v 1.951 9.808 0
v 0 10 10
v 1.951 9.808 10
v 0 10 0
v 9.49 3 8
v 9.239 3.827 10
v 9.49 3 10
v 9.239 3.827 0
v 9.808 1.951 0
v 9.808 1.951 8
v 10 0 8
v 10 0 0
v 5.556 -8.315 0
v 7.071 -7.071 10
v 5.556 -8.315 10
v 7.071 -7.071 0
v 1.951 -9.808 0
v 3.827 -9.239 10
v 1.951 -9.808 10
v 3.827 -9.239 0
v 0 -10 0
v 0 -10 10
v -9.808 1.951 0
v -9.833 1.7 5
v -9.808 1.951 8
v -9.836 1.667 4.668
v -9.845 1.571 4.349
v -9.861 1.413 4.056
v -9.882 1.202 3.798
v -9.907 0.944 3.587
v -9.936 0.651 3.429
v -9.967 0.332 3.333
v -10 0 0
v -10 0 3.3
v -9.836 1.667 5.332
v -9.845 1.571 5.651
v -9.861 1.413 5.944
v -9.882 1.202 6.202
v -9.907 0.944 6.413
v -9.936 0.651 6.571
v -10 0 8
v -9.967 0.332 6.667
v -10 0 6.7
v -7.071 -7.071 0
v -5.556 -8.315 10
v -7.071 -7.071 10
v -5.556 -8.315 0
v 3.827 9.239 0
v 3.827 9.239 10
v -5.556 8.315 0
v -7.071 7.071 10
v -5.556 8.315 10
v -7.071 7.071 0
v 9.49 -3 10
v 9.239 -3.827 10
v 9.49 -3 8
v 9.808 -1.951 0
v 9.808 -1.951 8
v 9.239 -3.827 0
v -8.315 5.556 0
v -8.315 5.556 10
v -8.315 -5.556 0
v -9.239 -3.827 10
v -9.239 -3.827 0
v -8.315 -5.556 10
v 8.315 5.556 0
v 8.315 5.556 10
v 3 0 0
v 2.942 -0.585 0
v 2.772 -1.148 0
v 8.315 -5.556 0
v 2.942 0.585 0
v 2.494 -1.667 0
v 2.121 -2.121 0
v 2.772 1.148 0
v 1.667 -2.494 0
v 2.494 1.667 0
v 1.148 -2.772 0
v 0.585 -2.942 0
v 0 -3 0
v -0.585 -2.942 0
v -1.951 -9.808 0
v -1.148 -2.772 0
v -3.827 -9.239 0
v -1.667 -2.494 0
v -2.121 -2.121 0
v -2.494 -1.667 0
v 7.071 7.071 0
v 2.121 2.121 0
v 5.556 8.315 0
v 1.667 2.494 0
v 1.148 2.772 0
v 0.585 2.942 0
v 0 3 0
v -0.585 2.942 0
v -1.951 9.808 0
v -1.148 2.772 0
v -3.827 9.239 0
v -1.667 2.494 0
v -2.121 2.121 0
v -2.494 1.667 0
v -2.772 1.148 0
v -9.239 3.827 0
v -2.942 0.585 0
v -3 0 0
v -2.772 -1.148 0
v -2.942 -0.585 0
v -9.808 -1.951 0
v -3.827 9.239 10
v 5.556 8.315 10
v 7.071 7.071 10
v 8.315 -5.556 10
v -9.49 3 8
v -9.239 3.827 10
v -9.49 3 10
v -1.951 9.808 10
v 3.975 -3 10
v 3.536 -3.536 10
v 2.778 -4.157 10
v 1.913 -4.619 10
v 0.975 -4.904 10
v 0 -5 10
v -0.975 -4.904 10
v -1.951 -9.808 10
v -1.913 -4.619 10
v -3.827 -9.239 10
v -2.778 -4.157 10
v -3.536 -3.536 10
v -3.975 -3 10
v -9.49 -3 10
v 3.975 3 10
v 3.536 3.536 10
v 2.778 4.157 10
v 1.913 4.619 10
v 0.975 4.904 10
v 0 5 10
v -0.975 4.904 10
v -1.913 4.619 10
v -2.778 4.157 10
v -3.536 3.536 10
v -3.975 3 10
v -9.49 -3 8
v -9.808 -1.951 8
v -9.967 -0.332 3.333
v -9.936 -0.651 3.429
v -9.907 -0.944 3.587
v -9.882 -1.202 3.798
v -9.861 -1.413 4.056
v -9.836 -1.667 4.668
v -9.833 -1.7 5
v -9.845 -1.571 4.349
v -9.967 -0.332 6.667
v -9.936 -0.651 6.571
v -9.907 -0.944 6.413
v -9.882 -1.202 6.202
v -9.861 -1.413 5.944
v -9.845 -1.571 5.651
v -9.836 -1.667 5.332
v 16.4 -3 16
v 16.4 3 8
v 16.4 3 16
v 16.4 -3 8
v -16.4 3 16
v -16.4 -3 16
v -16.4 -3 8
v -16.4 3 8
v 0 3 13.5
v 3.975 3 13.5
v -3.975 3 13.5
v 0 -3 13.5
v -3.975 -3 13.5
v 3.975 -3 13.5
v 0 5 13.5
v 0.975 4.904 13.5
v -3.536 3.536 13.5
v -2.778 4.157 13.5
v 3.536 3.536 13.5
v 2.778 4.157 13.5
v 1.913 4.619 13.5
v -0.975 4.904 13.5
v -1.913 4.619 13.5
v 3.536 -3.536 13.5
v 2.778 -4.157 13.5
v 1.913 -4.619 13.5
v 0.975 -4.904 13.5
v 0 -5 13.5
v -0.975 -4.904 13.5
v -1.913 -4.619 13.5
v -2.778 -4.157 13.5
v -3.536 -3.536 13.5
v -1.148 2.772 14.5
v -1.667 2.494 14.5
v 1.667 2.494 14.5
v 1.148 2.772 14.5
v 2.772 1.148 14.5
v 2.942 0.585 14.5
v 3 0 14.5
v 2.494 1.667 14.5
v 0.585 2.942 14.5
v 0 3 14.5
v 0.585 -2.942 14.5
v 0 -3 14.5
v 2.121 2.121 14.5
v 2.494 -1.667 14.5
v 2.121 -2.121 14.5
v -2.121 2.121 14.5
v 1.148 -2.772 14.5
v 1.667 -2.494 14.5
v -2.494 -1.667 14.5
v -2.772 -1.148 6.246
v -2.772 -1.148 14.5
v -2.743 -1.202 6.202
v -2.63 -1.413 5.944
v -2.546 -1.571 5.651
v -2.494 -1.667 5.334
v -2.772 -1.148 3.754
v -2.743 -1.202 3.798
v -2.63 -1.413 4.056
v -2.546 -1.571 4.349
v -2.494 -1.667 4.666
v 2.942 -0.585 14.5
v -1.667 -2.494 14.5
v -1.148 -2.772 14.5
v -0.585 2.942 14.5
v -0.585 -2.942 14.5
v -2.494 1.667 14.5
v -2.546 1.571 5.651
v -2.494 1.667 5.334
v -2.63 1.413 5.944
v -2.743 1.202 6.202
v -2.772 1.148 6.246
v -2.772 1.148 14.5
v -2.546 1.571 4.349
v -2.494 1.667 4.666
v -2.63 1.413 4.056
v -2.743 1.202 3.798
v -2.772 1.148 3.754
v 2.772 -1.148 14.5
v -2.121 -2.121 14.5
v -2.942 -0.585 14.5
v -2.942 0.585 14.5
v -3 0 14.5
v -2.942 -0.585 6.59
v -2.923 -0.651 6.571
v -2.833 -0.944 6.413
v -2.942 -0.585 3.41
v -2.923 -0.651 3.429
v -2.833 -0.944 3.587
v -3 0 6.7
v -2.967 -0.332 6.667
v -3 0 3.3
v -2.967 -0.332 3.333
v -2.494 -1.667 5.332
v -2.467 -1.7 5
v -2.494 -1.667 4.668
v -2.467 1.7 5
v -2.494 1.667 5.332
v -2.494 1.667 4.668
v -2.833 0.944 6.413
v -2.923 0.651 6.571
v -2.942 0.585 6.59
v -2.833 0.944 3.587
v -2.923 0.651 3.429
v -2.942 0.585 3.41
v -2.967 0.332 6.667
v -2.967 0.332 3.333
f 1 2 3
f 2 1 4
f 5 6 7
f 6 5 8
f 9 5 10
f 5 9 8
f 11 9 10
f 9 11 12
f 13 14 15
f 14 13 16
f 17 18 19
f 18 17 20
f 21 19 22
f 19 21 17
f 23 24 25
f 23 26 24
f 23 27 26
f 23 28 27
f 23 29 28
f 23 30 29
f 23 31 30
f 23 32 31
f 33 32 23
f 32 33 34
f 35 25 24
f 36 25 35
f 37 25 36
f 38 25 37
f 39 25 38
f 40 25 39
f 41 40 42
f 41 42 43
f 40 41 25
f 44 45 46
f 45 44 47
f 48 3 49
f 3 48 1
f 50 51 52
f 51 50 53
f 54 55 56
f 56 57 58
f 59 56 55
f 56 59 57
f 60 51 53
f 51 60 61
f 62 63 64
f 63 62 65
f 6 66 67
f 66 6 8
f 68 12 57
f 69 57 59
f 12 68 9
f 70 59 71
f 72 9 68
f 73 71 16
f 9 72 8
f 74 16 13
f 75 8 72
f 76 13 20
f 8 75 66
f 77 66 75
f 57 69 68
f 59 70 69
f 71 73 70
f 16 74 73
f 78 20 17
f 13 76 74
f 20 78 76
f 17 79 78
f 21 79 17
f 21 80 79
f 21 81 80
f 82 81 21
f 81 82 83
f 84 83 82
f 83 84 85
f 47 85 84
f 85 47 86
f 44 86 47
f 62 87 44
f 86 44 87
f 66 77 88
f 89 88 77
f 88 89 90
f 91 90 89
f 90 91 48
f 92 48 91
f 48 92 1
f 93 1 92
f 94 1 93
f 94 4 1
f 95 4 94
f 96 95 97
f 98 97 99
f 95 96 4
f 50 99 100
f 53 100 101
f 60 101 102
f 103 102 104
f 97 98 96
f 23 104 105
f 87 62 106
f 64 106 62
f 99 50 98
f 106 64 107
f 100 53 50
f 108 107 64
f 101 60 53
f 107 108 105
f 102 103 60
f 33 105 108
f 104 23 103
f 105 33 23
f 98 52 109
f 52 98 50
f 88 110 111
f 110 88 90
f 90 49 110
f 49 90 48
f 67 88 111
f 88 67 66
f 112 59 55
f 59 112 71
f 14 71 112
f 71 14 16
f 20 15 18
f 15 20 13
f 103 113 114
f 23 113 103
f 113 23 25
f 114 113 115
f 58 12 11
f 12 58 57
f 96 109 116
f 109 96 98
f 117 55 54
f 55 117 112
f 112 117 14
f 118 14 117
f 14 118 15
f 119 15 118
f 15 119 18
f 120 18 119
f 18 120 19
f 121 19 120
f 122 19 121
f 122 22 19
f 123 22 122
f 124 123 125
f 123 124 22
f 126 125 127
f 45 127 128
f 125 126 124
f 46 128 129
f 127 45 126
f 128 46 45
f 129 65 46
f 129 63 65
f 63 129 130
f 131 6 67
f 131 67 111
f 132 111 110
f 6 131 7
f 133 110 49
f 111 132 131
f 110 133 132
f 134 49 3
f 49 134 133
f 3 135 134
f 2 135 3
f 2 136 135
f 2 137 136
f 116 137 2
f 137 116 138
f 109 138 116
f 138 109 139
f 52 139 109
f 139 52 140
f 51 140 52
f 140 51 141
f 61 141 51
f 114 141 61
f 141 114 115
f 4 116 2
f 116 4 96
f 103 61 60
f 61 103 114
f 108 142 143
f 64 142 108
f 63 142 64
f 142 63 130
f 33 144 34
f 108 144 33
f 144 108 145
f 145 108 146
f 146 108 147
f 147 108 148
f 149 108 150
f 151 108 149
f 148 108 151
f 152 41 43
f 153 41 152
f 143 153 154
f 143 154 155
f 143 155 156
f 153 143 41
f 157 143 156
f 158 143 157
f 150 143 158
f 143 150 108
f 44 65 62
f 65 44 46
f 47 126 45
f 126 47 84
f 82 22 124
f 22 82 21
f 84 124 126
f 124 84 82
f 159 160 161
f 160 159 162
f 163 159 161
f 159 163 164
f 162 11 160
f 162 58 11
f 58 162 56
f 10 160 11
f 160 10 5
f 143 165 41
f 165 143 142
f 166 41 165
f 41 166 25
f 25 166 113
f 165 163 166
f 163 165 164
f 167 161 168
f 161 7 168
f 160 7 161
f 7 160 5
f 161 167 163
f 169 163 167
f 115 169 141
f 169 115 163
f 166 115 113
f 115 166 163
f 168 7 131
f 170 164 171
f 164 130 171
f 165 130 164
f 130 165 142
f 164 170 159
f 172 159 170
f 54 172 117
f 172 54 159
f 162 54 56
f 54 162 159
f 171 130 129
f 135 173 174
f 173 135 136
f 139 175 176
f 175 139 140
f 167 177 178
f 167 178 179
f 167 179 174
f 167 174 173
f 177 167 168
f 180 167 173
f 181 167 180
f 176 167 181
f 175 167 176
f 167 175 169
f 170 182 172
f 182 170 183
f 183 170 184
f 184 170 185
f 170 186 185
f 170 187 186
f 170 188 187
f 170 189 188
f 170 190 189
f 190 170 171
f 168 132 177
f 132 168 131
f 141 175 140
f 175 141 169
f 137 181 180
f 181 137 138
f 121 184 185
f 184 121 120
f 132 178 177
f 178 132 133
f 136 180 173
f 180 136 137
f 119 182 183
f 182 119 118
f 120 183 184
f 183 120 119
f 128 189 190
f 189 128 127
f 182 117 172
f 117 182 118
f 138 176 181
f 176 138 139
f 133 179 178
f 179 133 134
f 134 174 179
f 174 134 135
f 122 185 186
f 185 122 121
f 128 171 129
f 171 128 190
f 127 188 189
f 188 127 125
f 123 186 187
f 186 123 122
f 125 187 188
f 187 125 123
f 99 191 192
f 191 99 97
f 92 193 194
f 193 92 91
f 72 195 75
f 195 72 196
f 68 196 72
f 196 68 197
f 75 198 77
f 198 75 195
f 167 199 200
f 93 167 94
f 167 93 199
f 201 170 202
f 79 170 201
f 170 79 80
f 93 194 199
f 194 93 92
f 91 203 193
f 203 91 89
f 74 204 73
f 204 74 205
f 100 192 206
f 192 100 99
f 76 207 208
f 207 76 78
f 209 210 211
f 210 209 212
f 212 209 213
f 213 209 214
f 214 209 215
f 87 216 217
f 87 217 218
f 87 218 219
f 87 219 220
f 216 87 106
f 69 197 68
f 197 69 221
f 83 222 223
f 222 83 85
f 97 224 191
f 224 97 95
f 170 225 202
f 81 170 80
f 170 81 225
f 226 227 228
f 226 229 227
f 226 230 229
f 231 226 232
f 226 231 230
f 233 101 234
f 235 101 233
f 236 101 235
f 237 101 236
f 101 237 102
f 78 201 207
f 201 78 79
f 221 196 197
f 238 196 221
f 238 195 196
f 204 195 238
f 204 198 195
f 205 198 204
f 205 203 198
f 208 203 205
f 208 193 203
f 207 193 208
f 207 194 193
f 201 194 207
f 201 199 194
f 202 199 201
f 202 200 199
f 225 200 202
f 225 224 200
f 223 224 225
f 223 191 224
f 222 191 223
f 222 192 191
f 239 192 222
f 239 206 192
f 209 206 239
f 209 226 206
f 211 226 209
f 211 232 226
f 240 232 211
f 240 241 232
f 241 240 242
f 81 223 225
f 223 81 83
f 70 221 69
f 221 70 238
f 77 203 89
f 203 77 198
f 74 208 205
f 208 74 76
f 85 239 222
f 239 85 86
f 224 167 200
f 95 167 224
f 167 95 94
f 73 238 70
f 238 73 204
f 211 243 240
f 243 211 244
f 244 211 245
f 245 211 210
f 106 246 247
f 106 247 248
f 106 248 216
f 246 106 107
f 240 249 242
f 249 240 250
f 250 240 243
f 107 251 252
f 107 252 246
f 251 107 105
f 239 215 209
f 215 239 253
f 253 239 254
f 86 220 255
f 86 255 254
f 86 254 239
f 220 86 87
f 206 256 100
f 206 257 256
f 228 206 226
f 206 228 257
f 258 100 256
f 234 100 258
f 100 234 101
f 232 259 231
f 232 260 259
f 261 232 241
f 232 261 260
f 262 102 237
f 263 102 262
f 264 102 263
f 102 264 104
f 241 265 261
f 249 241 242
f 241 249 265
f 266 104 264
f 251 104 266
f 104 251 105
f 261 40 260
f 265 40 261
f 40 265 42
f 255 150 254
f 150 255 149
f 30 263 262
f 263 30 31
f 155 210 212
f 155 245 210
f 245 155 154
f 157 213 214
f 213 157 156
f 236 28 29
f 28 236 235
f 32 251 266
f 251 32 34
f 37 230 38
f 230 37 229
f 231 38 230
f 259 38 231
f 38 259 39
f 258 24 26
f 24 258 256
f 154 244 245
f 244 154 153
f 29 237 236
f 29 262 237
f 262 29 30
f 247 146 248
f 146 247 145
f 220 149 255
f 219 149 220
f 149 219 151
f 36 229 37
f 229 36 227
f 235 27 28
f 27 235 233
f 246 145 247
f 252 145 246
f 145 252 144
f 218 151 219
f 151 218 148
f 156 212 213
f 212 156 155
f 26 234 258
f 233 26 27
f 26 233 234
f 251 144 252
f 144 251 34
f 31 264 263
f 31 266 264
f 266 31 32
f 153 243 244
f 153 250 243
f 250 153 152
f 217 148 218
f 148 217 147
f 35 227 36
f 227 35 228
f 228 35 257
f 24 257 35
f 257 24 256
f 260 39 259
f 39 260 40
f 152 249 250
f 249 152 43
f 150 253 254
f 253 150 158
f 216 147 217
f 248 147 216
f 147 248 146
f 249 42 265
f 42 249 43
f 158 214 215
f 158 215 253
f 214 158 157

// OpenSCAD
$fn = 32;

// ----------------------------------------------------------------------
// Hand knob: 20 x 32.8 x 13.5 mm
// ----------------------------------------------------------------------

// --- parameters (mm) ---
head_d = 20;              // knob diameter
head_h = 10;              // knob height
hole_d = 6;               // shaft bore
set_d = 3.4;              // set screw tap hole
wing_l = 32.8;            // wing span
wing_w = 6;               // wing width
wing_h = 6;               // wing thickness
cap_h = 3.5;              // raised centre cap
cap_d = 10;               // centre cap diameter

module body() {
  cylinder(h = head_h, d = head_d);
}

module wing() {
  /* wing sunk 2 mm into the knob so the joint overlaps */
  translate([-wing_l / 2, -wing_w / 2, head_h - 2])
    cube([wing_l, wing_w, wing_h + 2]);
}

module cap() {
  translate([0, 0, head_h - 1]) cylinder(h = cap_h + 1, d = cap_d);
}

difference() {
  union() {
    body();
    wing();
    cap();
  }
  translate([0, 0, -1]) cylinder(h = head_h + cap_h + 2, d = hole_d);
  translate([-head_d / 2 - 1, 0, head_h * 0.5]) rotate([0, 90, 0]) cylinder(h = head_d / 2 + 2, d = set_d);
}
